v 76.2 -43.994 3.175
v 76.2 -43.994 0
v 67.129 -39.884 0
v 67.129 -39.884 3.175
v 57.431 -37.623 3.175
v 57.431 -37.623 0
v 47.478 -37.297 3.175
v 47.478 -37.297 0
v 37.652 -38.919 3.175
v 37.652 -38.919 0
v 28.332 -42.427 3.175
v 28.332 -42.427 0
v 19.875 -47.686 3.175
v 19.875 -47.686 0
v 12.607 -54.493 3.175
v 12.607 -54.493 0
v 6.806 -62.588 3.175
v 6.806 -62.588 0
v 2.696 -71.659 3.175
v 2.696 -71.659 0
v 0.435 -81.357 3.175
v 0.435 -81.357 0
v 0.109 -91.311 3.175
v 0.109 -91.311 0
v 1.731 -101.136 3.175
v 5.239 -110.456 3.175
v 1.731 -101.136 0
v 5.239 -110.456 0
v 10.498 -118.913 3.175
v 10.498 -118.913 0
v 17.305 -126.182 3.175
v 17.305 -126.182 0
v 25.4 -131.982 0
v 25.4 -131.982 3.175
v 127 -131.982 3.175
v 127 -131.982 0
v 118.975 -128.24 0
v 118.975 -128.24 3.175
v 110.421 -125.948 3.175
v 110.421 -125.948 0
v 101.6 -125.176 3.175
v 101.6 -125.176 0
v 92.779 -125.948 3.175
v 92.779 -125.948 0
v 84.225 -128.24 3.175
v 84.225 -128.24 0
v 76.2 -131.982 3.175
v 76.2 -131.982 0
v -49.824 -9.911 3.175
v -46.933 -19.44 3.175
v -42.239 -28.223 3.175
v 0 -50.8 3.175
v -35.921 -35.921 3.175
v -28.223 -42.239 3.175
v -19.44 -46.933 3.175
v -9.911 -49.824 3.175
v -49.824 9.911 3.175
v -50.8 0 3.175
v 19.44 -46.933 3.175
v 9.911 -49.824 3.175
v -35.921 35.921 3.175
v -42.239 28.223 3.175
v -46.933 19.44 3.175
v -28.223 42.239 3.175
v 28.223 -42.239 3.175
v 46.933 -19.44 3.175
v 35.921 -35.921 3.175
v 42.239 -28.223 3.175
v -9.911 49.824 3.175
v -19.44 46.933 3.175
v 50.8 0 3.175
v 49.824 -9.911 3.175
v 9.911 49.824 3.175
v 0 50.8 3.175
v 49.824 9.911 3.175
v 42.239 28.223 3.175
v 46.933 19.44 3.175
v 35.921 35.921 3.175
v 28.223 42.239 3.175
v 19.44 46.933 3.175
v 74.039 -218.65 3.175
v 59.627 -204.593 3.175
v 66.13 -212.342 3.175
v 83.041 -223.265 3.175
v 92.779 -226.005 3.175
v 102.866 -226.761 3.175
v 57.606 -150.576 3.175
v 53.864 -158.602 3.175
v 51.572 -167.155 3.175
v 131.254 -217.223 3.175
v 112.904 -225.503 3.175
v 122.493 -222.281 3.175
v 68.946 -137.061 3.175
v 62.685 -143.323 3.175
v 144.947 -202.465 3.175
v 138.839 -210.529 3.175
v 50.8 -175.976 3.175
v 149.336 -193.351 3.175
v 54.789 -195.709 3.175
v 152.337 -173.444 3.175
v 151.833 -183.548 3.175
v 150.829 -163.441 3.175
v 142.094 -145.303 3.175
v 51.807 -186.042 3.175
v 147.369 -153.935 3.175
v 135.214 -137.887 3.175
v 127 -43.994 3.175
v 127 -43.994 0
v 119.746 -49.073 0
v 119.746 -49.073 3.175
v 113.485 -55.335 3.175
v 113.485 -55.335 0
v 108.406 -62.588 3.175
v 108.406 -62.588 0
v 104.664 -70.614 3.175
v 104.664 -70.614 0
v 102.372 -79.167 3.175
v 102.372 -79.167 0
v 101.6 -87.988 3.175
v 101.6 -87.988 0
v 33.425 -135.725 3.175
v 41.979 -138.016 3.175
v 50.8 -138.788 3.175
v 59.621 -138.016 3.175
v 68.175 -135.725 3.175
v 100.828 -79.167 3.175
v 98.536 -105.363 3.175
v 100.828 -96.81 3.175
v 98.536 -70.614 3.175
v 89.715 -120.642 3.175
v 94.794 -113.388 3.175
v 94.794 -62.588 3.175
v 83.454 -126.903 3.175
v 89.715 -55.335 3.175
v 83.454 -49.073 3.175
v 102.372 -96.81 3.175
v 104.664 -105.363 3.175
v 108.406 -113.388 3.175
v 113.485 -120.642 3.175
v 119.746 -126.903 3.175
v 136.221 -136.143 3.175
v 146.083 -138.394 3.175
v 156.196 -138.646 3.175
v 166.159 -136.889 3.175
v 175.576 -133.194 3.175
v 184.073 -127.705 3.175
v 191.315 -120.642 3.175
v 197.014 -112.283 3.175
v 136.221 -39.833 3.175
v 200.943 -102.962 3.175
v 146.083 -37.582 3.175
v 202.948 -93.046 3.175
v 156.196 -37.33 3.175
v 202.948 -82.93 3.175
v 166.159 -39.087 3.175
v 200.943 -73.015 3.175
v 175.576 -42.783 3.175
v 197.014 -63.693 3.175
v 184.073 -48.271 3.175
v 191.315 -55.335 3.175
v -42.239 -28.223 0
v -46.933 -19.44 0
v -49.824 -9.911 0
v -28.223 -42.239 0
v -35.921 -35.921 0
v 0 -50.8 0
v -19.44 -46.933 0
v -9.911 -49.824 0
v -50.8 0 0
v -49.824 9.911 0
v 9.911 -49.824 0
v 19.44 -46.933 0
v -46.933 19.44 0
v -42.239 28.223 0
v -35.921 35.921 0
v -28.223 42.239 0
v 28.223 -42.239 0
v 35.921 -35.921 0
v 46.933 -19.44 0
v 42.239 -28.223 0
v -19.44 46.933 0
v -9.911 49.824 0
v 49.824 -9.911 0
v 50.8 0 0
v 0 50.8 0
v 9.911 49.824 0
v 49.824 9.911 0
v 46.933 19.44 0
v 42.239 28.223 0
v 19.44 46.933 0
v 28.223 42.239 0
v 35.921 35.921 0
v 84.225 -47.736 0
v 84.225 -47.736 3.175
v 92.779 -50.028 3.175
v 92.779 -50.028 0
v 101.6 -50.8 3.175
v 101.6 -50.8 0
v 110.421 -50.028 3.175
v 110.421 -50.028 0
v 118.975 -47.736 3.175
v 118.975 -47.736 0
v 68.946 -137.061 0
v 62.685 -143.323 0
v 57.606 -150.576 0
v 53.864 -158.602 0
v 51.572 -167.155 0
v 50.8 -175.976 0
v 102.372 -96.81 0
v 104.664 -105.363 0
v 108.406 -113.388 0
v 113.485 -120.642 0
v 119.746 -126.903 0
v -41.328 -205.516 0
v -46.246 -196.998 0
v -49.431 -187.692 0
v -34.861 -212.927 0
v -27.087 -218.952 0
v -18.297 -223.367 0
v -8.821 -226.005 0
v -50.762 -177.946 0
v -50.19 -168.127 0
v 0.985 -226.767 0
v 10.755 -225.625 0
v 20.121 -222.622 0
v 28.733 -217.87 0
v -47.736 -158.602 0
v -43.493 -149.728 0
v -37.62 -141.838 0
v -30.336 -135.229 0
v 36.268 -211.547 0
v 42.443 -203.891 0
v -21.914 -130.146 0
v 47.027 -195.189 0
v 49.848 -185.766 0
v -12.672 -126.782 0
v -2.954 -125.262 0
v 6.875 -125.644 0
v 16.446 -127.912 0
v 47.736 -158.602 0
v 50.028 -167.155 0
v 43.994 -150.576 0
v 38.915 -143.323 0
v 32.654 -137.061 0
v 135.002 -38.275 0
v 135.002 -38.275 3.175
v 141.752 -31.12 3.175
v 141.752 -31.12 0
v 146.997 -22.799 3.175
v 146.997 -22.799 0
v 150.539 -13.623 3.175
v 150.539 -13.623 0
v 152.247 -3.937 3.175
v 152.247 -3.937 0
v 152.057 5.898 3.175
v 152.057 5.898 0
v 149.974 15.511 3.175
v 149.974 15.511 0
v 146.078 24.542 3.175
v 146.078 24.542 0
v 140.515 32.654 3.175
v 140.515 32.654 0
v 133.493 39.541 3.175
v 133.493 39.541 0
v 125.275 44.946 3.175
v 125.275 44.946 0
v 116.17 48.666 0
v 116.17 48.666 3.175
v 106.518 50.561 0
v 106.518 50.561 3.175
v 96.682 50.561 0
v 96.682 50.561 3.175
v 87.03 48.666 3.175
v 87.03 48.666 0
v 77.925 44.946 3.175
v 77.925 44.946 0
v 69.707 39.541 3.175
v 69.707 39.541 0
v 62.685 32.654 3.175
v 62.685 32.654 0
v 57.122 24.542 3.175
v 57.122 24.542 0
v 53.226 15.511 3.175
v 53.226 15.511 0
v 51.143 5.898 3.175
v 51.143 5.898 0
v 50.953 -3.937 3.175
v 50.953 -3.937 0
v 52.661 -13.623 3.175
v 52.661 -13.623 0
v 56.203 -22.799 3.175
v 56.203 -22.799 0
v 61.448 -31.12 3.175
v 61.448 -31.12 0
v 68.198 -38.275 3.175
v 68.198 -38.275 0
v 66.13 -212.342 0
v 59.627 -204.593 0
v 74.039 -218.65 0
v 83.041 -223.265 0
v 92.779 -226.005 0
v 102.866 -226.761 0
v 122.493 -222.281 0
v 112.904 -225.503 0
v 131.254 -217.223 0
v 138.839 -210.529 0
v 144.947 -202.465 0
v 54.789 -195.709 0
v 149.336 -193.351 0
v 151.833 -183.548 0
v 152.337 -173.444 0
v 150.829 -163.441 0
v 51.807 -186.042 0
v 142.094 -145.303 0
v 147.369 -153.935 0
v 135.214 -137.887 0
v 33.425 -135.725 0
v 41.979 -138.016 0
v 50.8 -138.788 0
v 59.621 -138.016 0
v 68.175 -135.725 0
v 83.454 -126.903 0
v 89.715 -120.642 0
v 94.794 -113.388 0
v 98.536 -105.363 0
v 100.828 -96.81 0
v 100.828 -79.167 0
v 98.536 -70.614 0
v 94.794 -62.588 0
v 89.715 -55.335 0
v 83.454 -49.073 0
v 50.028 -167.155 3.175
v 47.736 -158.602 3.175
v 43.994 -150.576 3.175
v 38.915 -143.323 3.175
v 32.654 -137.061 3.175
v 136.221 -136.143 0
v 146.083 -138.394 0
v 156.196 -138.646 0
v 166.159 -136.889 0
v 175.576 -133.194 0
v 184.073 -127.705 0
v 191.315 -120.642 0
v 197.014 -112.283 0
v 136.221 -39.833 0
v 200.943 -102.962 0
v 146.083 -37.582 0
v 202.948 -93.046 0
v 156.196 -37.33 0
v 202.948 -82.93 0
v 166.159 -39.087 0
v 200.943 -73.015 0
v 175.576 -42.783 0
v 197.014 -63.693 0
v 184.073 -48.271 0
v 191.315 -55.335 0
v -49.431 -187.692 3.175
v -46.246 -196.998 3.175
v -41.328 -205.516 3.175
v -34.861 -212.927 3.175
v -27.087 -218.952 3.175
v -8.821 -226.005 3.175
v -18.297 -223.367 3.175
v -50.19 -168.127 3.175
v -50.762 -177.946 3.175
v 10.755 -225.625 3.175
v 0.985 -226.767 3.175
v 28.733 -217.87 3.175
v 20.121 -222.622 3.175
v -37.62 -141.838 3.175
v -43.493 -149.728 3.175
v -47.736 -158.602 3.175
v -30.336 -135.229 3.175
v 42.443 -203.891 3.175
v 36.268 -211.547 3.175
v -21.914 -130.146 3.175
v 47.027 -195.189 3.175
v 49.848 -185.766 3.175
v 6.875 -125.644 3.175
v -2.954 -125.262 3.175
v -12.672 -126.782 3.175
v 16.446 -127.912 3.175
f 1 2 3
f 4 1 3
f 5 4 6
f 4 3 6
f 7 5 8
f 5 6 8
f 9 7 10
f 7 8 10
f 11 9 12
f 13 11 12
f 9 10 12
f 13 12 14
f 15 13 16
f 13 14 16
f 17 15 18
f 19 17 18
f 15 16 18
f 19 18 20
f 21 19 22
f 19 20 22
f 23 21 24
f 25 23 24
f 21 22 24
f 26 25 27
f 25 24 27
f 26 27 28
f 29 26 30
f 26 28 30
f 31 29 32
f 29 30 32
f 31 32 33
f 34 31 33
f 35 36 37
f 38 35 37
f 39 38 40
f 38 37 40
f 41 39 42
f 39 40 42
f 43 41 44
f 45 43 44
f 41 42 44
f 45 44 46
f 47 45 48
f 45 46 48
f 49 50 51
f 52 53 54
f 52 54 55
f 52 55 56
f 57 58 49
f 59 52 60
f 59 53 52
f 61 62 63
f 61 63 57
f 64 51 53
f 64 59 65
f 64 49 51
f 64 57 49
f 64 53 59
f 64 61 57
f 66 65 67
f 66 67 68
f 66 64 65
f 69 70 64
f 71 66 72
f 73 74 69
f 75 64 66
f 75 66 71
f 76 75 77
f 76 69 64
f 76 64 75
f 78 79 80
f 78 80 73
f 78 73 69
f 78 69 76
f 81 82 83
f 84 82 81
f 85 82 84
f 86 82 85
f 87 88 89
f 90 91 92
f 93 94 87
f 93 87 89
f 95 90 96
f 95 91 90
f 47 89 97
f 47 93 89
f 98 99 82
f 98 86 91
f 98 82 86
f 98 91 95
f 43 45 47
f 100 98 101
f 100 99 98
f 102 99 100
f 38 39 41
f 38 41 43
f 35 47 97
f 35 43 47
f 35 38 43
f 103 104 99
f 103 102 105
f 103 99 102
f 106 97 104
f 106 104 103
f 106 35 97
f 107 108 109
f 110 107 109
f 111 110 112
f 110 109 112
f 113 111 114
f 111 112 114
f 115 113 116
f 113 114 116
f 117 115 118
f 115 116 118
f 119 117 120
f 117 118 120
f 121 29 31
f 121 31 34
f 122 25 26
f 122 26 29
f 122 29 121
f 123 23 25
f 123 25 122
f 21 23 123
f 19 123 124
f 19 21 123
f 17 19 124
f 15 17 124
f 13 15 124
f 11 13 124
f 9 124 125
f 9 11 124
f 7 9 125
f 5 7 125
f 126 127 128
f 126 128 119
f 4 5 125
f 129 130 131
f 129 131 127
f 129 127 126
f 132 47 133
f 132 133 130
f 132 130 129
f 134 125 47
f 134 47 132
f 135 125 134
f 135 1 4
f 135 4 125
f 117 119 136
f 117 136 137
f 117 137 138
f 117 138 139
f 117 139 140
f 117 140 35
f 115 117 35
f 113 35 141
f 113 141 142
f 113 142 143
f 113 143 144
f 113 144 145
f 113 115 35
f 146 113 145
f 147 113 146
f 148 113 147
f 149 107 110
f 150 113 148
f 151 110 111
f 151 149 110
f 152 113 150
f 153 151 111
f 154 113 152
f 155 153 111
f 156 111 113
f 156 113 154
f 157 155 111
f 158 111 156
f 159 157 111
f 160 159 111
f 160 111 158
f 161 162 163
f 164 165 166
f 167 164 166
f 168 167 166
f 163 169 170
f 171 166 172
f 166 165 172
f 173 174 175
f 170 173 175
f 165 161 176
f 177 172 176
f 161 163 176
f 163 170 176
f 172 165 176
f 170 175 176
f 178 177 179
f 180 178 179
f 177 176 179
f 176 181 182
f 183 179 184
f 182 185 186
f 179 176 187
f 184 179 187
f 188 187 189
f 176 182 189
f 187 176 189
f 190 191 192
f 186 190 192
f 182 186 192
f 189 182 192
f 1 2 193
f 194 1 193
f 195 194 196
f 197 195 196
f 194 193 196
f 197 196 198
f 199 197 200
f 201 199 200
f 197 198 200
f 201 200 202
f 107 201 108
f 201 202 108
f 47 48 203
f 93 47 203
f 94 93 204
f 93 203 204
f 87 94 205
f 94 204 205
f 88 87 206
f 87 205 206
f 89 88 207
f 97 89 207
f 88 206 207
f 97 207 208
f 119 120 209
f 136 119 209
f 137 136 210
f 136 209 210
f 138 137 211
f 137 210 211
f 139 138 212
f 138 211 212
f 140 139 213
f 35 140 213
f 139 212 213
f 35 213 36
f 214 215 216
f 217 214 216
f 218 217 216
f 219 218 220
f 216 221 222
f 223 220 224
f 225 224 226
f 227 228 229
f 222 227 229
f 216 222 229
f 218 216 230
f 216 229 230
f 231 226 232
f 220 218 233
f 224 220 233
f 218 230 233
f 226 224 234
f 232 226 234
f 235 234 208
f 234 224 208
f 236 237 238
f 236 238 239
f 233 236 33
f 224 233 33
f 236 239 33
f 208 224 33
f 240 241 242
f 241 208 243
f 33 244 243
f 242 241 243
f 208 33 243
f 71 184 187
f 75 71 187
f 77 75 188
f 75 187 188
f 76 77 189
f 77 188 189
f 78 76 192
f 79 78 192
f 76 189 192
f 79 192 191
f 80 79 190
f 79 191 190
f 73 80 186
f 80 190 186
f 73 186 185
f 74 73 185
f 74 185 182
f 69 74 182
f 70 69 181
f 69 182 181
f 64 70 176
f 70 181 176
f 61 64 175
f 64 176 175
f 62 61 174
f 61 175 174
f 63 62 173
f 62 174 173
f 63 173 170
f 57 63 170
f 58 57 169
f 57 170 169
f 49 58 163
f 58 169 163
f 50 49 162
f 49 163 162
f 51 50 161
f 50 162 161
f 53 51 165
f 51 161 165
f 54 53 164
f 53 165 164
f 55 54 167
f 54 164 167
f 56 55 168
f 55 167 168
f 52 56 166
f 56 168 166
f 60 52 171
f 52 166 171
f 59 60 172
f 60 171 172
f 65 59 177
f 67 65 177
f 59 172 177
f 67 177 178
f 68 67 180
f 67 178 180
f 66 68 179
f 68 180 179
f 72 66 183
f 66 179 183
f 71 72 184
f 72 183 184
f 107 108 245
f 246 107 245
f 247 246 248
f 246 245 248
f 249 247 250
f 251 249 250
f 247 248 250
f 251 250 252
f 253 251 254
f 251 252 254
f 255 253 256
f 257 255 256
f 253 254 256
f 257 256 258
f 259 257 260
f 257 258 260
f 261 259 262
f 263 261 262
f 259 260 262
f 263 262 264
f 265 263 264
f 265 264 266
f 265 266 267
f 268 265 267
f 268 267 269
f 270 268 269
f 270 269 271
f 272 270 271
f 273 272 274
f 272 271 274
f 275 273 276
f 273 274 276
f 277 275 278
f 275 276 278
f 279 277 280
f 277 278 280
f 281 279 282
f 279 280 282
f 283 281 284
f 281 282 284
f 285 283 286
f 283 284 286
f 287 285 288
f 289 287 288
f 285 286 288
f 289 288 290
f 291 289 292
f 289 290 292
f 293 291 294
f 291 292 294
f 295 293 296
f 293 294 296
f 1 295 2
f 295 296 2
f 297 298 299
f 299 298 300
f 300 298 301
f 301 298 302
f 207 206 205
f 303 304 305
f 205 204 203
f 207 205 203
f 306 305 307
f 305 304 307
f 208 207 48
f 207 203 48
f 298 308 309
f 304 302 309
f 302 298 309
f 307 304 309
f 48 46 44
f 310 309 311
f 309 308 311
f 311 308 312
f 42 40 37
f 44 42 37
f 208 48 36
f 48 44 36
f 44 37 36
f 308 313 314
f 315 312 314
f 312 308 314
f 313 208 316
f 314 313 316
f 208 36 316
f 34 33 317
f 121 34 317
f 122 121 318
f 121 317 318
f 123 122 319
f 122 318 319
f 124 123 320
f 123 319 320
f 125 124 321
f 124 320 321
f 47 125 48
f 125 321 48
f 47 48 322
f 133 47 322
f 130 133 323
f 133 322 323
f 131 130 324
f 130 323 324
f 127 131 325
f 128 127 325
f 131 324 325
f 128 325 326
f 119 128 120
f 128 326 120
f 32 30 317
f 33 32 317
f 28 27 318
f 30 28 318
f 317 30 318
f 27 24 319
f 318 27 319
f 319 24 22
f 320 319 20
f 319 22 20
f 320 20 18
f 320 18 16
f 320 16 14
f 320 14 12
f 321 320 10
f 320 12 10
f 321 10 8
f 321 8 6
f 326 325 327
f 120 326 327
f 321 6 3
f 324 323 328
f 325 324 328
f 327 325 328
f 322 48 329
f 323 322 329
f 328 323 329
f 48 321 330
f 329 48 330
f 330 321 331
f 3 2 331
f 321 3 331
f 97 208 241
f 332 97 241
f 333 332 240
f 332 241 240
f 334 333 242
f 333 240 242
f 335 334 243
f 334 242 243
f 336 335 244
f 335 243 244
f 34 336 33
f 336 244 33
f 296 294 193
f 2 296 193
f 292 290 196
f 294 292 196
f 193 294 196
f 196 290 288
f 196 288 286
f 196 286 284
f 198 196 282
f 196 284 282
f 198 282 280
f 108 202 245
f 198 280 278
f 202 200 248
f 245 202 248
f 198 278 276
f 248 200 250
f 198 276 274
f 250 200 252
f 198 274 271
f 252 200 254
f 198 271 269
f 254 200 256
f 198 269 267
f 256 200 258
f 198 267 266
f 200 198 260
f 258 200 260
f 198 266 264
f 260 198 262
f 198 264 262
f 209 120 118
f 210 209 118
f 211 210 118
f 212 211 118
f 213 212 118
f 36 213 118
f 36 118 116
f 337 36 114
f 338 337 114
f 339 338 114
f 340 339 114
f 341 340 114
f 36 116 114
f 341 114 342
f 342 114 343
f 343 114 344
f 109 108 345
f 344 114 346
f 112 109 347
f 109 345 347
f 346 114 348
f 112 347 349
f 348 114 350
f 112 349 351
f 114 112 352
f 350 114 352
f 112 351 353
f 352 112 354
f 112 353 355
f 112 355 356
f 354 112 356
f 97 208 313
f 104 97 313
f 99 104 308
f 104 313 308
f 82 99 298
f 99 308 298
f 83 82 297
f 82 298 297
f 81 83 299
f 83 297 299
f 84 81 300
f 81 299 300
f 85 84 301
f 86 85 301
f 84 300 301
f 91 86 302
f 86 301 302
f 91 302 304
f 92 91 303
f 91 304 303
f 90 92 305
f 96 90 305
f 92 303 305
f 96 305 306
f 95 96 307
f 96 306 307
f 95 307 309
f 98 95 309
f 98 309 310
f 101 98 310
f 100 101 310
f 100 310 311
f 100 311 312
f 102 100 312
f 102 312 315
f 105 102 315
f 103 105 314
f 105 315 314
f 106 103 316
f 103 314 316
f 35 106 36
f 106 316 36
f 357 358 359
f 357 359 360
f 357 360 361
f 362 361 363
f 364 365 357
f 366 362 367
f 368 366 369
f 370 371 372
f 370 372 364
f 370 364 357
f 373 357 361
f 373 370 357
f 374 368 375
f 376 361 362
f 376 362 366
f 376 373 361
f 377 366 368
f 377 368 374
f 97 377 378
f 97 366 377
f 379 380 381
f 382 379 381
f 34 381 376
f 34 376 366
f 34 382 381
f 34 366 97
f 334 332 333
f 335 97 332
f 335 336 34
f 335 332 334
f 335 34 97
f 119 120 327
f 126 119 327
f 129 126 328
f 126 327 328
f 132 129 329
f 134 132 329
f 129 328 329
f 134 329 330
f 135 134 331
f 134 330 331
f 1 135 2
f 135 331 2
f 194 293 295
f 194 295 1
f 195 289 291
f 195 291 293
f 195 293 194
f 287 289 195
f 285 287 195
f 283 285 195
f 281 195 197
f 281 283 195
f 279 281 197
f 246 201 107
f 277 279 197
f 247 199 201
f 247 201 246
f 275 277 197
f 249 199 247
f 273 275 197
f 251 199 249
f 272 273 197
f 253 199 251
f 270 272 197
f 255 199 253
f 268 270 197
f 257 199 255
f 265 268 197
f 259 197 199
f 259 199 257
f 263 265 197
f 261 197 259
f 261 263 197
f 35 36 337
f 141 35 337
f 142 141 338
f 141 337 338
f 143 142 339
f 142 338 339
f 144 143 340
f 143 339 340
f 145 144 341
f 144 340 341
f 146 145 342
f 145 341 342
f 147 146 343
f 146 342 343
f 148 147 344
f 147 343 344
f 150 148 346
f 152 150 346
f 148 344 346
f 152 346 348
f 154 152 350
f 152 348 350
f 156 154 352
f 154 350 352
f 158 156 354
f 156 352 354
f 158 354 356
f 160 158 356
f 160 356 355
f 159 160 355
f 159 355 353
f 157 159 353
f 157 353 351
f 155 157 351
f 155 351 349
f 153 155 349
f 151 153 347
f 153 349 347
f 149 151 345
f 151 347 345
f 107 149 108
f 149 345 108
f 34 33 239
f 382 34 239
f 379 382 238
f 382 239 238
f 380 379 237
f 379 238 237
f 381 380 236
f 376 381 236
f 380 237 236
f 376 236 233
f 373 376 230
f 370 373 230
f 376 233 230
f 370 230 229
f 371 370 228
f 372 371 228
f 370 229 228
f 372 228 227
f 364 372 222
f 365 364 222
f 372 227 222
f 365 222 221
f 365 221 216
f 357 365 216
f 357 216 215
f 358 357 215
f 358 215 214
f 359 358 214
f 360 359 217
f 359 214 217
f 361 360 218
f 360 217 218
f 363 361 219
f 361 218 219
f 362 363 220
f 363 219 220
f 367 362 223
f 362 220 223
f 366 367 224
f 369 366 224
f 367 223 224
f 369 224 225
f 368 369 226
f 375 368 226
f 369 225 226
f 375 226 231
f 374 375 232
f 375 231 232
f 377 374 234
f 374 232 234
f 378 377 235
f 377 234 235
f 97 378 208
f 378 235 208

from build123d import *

# Parameters (mm, degrees)
SKETCH1_R           = 50.8
BOSS_EXTRUDE1_DEPTH = 3.175
FILL_PATTERN1_DEPTH = 3.175


# Read off the part's stored shape, not the designer's step: Fill Pattern1
with BuildPart() as part:
    # Sketch1 → Boss-Extrude1 (new body)
    with BuildSketch(Plane.XY):
        Circle(SKETCH1_R)
    extrude(amount=BOSS_EXTRUDE1_DEPTH)


with BuildPart() as body_2:
    # Fill Pattern1 outline → Fill Pattern1 (new body)
    with BuildSketch(Plane.XY):
        with BuildLine():
            ThreePointArc((127.000000809, -131.982272003), (203.2, -87.988180558), (127.000000001, -43.994090511))
            ThreePointArc((127.000000001, -43.994090511), (108.405909488, -62.588181024), (101.6, -87.988181024))
            ThreePointArc((101.6, -87.988181024), (108.405909721, -113.388181428), (127.000000809, -131.982272003))
        make_face()
        with BuildLine():
            ThreePointArc((76.2, -43.994090512), (101.6, -50.8), (127.000000001, -43.994090512))
            ThreePointArc((127.000000001, -43.994090512), (101.6, 50.8), (76.2, -43.994090512))
        make_face()
        with BuildLine():
            ThreePointArc((50.8, -175.976362049), (126.999999596, -219.970452795), (127.000000809, -131.982272004))
            ThreePointArc((127.000000809, -131.982272004), (101.600000016, -125.176362049), (76.19999922, -131.982271987))
            ThreePointArc((76.19999922, -131.982271987), (57.605909262, -150.576362439), (50.8, -175.976362049))
        make_face()
        with BuildLine():
            ThreePointArc((76.199999219, -131.982271987), (94.794090287, -113.388181414), (101.6, -87.988181024))
            ThreePointArc((101.6, -87.988181024), (94.794090512, -62.588181024), (76.2, -43.994090512))
            ThreePointArc((76.2, -43.994090512), (6.805909644, -62.588180753), (25.399999458, -131.982271224))
            ThreePointArc((25.399999458, -131.982271224), (50.799999237, -138.788181024), (76.199999219, -131.982271987))
        make_face()
        with BuildLine():
            ThreePointArc((50.8, -175.976362049), (43.994090356, -150.576361778), (25.399999458, -131.982271224))
            ThreePointArc((25.399999458, -131.982271224), (-43.994090356, -201.37636232), (50.8, -175.976362049))
        make_face()
    extrude(amount=FILL_PATTERN1_DEPTH)


solid = Compound([part.part, body_2.part])
